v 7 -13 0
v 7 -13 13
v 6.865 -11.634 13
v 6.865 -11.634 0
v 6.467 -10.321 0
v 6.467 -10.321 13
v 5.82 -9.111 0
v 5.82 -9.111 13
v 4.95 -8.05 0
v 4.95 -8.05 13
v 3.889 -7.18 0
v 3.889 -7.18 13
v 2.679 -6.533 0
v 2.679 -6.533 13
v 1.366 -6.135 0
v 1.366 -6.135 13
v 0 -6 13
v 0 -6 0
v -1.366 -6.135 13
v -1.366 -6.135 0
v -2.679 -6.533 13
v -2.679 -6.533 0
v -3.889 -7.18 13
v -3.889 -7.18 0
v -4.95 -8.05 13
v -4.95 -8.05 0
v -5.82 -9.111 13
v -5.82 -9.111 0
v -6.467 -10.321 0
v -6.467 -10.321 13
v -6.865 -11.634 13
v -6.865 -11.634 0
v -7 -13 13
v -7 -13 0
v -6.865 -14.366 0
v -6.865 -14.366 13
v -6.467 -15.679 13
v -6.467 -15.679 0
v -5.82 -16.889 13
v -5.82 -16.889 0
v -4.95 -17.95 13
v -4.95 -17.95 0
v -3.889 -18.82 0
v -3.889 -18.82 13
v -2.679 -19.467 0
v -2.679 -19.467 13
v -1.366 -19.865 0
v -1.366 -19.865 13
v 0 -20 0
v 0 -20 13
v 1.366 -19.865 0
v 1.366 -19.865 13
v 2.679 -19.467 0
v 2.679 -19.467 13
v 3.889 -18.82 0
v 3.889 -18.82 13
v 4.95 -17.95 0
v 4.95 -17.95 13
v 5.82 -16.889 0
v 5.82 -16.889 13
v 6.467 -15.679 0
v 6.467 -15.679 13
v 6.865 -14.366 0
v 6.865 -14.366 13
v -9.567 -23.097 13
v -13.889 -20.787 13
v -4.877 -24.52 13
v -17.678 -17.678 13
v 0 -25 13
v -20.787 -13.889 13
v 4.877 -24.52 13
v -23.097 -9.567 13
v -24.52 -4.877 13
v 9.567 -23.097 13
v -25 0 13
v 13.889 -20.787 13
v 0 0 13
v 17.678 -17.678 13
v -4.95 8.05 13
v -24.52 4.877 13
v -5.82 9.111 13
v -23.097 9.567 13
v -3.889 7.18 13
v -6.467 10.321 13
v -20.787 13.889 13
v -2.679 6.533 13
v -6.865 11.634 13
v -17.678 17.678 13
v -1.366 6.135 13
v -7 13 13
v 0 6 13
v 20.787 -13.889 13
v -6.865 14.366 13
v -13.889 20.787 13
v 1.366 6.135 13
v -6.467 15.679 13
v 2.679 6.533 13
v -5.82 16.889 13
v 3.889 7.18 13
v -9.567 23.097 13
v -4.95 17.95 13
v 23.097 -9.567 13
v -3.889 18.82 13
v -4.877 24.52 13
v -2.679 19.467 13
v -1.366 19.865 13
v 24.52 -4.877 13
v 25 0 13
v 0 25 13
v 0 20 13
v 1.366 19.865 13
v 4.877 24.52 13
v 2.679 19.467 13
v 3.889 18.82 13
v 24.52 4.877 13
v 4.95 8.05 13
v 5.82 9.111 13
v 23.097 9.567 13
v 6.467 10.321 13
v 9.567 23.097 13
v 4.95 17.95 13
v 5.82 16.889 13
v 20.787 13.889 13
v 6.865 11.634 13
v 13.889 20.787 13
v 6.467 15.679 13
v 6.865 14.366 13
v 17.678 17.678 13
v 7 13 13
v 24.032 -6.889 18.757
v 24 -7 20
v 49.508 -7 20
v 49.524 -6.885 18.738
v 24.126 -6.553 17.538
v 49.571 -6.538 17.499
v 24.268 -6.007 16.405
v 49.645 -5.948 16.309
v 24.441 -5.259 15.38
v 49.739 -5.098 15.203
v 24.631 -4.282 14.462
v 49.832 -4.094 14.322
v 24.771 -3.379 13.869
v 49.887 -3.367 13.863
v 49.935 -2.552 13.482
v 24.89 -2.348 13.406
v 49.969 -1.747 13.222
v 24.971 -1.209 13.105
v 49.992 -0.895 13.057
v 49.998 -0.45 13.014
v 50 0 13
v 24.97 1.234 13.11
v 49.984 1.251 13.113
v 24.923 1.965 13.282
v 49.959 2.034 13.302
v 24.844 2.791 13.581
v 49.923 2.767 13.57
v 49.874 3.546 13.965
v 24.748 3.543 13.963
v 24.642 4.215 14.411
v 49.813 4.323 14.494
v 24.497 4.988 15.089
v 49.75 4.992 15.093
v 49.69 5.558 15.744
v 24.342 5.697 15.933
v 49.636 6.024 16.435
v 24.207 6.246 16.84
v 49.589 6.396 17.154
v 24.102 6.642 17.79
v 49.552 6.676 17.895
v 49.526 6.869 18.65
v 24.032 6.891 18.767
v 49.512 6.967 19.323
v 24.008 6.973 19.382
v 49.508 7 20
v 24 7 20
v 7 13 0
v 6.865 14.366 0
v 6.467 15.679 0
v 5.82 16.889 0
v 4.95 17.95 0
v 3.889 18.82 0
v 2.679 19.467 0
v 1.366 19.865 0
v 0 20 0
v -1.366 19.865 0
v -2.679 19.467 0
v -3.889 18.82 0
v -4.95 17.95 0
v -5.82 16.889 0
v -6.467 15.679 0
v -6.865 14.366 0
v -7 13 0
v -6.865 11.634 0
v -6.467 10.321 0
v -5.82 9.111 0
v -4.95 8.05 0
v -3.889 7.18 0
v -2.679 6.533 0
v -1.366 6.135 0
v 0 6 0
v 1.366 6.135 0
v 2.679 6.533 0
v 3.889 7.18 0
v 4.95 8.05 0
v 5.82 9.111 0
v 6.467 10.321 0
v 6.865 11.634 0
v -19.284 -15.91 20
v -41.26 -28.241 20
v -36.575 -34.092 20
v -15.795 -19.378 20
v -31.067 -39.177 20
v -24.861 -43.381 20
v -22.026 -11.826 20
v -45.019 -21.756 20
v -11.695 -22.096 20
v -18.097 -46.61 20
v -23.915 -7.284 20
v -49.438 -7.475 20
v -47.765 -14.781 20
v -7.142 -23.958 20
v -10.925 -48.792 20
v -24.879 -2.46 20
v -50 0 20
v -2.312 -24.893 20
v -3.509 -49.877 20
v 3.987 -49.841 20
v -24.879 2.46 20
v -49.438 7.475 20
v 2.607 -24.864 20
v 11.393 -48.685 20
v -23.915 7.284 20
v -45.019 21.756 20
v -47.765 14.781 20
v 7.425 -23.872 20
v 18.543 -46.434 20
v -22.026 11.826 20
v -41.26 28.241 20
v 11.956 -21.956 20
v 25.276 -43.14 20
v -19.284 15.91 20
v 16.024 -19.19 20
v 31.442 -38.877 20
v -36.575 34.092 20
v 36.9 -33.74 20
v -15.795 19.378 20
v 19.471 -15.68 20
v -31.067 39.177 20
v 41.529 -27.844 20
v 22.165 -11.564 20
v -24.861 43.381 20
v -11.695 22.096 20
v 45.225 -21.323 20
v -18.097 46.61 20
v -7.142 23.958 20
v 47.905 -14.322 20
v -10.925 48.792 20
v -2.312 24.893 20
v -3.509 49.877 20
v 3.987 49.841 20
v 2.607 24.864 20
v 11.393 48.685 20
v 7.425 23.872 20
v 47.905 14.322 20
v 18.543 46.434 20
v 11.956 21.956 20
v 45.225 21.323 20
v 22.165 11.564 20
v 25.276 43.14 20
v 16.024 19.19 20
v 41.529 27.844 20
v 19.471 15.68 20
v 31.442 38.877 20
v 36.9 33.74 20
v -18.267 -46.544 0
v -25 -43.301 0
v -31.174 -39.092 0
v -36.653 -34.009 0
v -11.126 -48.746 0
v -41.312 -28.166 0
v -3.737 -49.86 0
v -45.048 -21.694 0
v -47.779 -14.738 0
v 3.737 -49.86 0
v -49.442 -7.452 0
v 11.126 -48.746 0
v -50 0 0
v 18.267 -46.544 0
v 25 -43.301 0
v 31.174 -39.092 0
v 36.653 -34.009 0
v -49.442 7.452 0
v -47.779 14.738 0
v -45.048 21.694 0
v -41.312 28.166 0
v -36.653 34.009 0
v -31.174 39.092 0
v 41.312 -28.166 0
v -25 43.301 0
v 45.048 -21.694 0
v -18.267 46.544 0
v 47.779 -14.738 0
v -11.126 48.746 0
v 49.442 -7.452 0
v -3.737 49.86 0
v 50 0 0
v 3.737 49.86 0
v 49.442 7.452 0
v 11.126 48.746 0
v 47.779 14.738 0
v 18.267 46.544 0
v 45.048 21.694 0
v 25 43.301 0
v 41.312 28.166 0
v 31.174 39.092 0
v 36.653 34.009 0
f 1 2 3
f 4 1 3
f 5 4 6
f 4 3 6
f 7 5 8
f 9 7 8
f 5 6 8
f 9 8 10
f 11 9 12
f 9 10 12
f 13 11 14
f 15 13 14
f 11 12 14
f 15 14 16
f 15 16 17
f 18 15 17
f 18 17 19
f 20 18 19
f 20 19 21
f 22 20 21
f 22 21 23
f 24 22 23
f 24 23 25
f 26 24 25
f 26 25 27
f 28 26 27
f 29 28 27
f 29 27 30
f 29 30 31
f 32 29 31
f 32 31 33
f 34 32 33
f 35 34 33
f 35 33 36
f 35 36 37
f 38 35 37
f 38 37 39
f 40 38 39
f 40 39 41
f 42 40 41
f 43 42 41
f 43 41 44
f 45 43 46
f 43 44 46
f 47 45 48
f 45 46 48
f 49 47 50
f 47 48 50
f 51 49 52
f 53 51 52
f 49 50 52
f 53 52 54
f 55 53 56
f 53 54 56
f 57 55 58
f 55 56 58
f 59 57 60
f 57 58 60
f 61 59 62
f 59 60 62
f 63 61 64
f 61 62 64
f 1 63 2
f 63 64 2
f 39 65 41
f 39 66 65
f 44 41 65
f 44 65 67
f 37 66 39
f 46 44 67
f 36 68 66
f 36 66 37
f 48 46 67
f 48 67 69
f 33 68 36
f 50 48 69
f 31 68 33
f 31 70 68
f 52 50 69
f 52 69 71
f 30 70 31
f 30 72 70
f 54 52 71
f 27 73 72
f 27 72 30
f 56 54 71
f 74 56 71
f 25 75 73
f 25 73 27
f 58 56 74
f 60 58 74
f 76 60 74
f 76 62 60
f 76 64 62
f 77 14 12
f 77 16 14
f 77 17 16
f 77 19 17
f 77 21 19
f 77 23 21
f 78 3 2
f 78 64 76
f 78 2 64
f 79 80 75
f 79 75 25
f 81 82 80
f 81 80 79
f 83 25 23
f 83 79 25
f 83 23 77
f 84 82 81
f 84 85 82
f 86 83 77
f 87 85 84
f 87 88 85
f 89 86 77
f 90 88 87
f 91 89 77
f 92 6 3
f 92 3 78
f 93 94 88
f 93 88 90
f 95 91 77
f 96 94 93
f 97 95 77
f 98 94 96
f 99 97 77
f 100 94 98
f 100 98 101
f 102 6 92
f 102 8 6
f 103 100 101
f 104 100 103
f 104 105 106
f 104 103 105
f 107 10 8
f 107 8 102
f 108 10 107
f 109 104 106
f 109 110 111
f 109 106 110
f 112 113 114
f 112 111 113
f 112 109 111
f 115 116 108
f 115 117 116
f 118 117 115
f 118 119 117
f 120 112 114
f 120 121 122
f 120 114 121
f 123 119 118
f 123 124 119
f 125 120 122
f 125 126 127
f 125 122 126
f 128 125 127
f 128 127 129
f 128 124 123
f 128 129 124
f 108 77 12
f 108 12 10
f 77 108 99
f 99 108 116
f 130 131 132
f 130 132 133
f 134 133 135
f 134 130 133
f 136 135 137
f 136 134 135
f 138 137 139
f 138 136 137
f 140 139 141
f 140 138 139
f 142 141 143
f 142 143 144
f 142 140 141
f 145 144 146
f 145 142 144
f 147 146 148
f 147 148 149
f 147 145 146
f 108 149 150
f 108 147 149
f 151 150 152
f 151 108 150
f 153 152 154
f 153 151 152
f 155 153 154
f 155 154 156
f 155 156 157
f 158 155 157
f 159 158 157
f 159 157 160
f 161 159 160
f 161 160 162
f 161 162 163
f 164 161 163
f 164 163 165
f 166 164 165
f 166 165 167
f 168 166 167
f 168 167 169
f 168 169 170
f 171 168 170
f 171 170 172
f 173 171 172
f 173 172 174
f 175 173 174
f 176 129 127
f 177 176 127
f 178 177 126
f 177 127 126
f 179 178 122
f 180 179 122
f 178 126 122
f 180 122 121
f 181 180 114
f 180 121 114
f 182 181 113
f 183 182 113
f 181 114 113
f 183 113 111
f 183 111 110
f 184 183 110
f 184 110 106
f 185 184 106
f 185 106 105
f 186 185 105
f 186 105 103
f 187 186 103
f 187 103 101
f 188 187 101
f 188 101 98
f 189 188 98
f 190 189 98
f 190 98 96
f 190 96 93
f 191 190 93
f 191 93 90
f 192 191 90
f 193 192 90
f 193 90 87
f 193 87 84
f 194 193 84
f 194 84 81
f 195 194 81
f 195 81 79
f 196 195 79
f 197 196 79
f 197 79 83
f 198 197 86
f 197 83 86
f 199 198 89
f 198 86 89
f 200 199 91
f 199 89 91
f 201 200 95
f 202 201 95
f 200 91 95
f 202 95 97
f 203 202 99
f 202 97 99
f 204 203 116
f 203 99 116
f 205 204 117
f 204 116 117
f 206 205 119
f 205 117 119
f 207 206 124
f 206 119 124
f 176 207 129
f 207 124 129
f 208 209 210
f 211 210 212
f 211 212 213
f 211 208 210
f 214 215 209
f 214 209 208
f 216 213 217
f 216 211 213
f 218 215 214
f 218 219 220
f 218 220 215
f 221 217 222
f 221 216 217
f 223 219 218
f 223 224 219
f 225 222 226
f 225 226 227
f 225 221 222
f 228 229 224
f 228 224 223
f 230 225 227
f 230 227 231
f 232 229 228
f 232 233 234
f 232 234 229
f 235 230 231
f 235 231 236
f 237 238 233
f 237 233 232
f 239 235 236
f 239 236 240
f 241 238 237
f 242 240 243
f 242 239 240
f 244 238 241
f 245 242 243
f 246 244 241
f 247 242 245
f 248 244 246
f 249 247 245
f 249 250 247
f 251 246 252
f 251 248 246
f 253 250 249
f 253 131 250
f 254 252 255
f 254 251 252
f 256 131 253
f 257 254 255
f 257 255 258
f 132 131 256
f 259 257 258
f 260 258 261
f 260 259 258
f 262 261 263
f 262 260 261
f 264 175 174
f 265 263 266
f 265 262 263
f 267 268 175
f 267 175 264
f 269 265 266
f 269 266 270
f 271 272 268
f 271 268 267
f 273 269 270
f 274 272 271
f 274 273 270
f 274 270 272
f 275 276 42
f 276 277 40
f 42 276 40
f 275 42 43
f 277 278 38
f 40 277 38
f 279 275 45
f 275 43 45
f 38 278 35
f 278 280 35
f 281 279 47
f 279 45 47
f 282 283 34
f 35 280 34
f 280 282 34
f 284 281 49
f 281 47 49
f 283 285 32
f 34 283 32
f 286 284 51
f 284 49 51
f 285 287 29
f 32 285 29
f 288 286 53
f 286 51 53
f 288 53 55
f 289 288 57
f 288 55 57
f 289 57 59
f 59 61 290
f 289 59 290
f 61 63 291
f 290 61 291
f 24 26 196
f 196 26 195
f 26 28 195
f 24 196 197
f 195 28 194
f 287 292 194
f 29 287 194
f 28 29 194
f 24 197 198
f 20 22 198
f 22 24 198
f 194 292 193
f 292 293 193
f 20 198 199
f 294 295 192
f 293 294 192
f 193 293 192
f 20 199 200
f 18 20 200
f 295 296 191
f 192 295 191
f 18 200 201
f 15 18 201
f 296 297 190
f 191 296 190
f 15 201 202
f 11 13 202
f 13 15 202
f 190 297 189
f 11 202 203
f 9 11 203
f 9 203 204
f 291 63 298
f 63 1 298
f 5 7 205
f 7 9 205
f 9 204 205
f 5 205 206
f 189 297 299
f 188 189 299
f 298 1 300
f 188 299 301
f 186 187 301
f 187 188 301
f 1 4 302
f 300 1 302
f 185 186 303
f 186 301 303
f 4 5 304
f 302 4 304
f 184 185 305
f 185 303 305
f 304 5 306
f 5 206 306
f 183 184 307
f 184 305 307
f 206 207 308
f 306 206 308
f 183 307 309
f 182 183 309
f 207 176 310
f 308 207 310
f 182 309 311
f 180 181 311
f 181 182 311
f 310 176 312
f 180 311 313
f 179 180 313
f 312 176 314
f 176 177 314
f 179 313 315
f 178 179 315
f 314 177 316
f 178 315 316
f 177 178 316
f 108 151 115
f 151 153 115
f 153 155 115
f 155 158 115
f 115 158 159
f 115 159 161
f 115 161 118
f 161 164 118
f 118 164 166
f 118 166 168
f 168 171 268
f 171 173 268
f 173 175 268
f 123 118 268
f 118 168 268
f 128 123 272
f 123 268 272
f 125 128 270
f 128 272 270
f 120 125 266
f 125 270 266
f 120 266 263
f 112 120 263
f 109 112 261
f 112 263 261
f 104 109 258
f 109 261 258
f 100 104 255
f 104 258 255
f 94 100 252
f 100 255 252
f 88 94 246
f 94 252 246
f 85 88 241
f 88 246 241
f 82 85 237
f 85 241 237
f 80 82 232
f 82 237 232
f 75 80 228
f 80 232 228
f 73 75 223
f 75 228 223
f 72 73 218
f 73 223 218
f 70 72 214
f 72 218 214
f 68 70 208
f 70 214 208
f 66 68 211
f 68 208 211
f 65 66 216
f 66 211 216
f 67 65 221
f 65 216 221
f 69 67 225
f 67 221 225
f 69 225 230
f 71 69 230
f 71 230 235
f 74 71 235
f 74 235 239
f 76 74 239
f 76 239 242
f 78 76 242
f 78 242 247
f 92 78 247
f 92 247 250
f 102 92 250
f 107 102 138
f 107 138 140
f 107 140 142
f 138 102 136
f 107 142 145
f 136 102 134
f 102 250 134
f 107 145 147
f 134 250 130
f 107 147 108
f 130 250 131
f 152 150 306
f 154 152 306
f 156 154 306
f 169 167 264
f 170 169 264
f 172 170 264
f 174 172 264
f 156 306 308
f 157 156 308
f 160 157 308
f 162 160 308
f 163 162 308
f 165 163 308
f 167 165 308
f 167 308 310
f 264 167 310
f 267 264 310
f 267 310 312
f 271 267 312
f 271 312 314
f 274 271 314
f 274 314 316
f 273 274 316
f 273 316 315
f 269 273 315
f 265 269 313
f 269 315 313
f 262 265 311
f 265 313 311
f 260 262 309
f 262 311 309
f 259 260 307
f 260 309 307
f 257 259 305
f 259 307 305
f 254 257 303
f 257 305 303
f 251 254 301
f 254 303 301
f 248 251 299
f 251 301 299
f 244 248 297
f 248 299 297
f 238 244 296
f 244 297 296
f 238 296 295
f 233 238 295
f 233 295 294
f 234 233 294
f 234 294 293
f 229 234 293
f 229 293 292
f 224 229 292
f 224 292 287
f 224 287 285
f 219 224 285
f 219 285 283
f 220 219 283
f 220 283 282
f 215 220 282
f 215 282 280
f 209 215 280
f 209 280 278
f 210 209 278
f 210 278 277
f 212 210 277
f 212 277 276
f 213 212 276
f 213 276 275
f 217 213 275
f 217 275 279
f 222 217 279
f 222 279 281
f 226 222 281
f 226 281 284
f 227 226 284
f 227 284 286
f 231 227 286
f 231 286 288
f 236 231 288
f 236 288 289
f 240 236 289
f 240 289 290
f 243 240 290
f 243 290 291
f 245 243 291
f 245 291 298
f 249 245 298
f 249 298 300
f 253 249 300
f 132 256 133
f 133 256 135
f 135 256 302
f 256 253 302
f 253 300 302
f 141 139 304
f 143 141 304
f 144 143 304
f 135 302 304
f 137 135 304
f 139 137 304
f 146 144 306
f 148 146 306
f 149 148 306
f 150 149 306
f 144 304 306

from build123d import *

# Parameters (mm, degrees)
F0_R     = 50
F1_DEPTH = 20
F2_R     = 25
F3_DEPTH = 7
F4_R     = 7
F5_DEPTH = 50.001
F6_R     = 7
F7_DEPTH = 20


with BuildPart() as f1:
    # F0 (on Top) → F1 (new body)
    with BuildSketch(Plane.XY):
        Circle(F0_R)
    extrude(amount=F1_DEPTH)

    # F2 (on face) → F3 (cut)
    with BuildSketch(Plane.XY.offset(20)):
        Circle(F2_R)
    extrude(amount=-F3_DEPTH, mode=Mode.SUBTRACT)

    # F4 (on Right) → F5 (cut, through all)
    with BuildSketch(Plane.YZ):
        with Locations((0, 20)):
            Circle(F4_R)
    extrude(amount=F5_DEPTH, mode=Mode.SUBTRACT)

    # F6 (on face) → F7 (cut)
    with BuildSketch(Plane.XY.offset(13)):
        with Locations((0, 13)):
            Circle(F6_R)
        with Locations((0, -13)):
            Circle(F6_R)
    extrude(amount=-F7_DEPTH, mode=Mode.SUBTRACT)


solid = f1.part
